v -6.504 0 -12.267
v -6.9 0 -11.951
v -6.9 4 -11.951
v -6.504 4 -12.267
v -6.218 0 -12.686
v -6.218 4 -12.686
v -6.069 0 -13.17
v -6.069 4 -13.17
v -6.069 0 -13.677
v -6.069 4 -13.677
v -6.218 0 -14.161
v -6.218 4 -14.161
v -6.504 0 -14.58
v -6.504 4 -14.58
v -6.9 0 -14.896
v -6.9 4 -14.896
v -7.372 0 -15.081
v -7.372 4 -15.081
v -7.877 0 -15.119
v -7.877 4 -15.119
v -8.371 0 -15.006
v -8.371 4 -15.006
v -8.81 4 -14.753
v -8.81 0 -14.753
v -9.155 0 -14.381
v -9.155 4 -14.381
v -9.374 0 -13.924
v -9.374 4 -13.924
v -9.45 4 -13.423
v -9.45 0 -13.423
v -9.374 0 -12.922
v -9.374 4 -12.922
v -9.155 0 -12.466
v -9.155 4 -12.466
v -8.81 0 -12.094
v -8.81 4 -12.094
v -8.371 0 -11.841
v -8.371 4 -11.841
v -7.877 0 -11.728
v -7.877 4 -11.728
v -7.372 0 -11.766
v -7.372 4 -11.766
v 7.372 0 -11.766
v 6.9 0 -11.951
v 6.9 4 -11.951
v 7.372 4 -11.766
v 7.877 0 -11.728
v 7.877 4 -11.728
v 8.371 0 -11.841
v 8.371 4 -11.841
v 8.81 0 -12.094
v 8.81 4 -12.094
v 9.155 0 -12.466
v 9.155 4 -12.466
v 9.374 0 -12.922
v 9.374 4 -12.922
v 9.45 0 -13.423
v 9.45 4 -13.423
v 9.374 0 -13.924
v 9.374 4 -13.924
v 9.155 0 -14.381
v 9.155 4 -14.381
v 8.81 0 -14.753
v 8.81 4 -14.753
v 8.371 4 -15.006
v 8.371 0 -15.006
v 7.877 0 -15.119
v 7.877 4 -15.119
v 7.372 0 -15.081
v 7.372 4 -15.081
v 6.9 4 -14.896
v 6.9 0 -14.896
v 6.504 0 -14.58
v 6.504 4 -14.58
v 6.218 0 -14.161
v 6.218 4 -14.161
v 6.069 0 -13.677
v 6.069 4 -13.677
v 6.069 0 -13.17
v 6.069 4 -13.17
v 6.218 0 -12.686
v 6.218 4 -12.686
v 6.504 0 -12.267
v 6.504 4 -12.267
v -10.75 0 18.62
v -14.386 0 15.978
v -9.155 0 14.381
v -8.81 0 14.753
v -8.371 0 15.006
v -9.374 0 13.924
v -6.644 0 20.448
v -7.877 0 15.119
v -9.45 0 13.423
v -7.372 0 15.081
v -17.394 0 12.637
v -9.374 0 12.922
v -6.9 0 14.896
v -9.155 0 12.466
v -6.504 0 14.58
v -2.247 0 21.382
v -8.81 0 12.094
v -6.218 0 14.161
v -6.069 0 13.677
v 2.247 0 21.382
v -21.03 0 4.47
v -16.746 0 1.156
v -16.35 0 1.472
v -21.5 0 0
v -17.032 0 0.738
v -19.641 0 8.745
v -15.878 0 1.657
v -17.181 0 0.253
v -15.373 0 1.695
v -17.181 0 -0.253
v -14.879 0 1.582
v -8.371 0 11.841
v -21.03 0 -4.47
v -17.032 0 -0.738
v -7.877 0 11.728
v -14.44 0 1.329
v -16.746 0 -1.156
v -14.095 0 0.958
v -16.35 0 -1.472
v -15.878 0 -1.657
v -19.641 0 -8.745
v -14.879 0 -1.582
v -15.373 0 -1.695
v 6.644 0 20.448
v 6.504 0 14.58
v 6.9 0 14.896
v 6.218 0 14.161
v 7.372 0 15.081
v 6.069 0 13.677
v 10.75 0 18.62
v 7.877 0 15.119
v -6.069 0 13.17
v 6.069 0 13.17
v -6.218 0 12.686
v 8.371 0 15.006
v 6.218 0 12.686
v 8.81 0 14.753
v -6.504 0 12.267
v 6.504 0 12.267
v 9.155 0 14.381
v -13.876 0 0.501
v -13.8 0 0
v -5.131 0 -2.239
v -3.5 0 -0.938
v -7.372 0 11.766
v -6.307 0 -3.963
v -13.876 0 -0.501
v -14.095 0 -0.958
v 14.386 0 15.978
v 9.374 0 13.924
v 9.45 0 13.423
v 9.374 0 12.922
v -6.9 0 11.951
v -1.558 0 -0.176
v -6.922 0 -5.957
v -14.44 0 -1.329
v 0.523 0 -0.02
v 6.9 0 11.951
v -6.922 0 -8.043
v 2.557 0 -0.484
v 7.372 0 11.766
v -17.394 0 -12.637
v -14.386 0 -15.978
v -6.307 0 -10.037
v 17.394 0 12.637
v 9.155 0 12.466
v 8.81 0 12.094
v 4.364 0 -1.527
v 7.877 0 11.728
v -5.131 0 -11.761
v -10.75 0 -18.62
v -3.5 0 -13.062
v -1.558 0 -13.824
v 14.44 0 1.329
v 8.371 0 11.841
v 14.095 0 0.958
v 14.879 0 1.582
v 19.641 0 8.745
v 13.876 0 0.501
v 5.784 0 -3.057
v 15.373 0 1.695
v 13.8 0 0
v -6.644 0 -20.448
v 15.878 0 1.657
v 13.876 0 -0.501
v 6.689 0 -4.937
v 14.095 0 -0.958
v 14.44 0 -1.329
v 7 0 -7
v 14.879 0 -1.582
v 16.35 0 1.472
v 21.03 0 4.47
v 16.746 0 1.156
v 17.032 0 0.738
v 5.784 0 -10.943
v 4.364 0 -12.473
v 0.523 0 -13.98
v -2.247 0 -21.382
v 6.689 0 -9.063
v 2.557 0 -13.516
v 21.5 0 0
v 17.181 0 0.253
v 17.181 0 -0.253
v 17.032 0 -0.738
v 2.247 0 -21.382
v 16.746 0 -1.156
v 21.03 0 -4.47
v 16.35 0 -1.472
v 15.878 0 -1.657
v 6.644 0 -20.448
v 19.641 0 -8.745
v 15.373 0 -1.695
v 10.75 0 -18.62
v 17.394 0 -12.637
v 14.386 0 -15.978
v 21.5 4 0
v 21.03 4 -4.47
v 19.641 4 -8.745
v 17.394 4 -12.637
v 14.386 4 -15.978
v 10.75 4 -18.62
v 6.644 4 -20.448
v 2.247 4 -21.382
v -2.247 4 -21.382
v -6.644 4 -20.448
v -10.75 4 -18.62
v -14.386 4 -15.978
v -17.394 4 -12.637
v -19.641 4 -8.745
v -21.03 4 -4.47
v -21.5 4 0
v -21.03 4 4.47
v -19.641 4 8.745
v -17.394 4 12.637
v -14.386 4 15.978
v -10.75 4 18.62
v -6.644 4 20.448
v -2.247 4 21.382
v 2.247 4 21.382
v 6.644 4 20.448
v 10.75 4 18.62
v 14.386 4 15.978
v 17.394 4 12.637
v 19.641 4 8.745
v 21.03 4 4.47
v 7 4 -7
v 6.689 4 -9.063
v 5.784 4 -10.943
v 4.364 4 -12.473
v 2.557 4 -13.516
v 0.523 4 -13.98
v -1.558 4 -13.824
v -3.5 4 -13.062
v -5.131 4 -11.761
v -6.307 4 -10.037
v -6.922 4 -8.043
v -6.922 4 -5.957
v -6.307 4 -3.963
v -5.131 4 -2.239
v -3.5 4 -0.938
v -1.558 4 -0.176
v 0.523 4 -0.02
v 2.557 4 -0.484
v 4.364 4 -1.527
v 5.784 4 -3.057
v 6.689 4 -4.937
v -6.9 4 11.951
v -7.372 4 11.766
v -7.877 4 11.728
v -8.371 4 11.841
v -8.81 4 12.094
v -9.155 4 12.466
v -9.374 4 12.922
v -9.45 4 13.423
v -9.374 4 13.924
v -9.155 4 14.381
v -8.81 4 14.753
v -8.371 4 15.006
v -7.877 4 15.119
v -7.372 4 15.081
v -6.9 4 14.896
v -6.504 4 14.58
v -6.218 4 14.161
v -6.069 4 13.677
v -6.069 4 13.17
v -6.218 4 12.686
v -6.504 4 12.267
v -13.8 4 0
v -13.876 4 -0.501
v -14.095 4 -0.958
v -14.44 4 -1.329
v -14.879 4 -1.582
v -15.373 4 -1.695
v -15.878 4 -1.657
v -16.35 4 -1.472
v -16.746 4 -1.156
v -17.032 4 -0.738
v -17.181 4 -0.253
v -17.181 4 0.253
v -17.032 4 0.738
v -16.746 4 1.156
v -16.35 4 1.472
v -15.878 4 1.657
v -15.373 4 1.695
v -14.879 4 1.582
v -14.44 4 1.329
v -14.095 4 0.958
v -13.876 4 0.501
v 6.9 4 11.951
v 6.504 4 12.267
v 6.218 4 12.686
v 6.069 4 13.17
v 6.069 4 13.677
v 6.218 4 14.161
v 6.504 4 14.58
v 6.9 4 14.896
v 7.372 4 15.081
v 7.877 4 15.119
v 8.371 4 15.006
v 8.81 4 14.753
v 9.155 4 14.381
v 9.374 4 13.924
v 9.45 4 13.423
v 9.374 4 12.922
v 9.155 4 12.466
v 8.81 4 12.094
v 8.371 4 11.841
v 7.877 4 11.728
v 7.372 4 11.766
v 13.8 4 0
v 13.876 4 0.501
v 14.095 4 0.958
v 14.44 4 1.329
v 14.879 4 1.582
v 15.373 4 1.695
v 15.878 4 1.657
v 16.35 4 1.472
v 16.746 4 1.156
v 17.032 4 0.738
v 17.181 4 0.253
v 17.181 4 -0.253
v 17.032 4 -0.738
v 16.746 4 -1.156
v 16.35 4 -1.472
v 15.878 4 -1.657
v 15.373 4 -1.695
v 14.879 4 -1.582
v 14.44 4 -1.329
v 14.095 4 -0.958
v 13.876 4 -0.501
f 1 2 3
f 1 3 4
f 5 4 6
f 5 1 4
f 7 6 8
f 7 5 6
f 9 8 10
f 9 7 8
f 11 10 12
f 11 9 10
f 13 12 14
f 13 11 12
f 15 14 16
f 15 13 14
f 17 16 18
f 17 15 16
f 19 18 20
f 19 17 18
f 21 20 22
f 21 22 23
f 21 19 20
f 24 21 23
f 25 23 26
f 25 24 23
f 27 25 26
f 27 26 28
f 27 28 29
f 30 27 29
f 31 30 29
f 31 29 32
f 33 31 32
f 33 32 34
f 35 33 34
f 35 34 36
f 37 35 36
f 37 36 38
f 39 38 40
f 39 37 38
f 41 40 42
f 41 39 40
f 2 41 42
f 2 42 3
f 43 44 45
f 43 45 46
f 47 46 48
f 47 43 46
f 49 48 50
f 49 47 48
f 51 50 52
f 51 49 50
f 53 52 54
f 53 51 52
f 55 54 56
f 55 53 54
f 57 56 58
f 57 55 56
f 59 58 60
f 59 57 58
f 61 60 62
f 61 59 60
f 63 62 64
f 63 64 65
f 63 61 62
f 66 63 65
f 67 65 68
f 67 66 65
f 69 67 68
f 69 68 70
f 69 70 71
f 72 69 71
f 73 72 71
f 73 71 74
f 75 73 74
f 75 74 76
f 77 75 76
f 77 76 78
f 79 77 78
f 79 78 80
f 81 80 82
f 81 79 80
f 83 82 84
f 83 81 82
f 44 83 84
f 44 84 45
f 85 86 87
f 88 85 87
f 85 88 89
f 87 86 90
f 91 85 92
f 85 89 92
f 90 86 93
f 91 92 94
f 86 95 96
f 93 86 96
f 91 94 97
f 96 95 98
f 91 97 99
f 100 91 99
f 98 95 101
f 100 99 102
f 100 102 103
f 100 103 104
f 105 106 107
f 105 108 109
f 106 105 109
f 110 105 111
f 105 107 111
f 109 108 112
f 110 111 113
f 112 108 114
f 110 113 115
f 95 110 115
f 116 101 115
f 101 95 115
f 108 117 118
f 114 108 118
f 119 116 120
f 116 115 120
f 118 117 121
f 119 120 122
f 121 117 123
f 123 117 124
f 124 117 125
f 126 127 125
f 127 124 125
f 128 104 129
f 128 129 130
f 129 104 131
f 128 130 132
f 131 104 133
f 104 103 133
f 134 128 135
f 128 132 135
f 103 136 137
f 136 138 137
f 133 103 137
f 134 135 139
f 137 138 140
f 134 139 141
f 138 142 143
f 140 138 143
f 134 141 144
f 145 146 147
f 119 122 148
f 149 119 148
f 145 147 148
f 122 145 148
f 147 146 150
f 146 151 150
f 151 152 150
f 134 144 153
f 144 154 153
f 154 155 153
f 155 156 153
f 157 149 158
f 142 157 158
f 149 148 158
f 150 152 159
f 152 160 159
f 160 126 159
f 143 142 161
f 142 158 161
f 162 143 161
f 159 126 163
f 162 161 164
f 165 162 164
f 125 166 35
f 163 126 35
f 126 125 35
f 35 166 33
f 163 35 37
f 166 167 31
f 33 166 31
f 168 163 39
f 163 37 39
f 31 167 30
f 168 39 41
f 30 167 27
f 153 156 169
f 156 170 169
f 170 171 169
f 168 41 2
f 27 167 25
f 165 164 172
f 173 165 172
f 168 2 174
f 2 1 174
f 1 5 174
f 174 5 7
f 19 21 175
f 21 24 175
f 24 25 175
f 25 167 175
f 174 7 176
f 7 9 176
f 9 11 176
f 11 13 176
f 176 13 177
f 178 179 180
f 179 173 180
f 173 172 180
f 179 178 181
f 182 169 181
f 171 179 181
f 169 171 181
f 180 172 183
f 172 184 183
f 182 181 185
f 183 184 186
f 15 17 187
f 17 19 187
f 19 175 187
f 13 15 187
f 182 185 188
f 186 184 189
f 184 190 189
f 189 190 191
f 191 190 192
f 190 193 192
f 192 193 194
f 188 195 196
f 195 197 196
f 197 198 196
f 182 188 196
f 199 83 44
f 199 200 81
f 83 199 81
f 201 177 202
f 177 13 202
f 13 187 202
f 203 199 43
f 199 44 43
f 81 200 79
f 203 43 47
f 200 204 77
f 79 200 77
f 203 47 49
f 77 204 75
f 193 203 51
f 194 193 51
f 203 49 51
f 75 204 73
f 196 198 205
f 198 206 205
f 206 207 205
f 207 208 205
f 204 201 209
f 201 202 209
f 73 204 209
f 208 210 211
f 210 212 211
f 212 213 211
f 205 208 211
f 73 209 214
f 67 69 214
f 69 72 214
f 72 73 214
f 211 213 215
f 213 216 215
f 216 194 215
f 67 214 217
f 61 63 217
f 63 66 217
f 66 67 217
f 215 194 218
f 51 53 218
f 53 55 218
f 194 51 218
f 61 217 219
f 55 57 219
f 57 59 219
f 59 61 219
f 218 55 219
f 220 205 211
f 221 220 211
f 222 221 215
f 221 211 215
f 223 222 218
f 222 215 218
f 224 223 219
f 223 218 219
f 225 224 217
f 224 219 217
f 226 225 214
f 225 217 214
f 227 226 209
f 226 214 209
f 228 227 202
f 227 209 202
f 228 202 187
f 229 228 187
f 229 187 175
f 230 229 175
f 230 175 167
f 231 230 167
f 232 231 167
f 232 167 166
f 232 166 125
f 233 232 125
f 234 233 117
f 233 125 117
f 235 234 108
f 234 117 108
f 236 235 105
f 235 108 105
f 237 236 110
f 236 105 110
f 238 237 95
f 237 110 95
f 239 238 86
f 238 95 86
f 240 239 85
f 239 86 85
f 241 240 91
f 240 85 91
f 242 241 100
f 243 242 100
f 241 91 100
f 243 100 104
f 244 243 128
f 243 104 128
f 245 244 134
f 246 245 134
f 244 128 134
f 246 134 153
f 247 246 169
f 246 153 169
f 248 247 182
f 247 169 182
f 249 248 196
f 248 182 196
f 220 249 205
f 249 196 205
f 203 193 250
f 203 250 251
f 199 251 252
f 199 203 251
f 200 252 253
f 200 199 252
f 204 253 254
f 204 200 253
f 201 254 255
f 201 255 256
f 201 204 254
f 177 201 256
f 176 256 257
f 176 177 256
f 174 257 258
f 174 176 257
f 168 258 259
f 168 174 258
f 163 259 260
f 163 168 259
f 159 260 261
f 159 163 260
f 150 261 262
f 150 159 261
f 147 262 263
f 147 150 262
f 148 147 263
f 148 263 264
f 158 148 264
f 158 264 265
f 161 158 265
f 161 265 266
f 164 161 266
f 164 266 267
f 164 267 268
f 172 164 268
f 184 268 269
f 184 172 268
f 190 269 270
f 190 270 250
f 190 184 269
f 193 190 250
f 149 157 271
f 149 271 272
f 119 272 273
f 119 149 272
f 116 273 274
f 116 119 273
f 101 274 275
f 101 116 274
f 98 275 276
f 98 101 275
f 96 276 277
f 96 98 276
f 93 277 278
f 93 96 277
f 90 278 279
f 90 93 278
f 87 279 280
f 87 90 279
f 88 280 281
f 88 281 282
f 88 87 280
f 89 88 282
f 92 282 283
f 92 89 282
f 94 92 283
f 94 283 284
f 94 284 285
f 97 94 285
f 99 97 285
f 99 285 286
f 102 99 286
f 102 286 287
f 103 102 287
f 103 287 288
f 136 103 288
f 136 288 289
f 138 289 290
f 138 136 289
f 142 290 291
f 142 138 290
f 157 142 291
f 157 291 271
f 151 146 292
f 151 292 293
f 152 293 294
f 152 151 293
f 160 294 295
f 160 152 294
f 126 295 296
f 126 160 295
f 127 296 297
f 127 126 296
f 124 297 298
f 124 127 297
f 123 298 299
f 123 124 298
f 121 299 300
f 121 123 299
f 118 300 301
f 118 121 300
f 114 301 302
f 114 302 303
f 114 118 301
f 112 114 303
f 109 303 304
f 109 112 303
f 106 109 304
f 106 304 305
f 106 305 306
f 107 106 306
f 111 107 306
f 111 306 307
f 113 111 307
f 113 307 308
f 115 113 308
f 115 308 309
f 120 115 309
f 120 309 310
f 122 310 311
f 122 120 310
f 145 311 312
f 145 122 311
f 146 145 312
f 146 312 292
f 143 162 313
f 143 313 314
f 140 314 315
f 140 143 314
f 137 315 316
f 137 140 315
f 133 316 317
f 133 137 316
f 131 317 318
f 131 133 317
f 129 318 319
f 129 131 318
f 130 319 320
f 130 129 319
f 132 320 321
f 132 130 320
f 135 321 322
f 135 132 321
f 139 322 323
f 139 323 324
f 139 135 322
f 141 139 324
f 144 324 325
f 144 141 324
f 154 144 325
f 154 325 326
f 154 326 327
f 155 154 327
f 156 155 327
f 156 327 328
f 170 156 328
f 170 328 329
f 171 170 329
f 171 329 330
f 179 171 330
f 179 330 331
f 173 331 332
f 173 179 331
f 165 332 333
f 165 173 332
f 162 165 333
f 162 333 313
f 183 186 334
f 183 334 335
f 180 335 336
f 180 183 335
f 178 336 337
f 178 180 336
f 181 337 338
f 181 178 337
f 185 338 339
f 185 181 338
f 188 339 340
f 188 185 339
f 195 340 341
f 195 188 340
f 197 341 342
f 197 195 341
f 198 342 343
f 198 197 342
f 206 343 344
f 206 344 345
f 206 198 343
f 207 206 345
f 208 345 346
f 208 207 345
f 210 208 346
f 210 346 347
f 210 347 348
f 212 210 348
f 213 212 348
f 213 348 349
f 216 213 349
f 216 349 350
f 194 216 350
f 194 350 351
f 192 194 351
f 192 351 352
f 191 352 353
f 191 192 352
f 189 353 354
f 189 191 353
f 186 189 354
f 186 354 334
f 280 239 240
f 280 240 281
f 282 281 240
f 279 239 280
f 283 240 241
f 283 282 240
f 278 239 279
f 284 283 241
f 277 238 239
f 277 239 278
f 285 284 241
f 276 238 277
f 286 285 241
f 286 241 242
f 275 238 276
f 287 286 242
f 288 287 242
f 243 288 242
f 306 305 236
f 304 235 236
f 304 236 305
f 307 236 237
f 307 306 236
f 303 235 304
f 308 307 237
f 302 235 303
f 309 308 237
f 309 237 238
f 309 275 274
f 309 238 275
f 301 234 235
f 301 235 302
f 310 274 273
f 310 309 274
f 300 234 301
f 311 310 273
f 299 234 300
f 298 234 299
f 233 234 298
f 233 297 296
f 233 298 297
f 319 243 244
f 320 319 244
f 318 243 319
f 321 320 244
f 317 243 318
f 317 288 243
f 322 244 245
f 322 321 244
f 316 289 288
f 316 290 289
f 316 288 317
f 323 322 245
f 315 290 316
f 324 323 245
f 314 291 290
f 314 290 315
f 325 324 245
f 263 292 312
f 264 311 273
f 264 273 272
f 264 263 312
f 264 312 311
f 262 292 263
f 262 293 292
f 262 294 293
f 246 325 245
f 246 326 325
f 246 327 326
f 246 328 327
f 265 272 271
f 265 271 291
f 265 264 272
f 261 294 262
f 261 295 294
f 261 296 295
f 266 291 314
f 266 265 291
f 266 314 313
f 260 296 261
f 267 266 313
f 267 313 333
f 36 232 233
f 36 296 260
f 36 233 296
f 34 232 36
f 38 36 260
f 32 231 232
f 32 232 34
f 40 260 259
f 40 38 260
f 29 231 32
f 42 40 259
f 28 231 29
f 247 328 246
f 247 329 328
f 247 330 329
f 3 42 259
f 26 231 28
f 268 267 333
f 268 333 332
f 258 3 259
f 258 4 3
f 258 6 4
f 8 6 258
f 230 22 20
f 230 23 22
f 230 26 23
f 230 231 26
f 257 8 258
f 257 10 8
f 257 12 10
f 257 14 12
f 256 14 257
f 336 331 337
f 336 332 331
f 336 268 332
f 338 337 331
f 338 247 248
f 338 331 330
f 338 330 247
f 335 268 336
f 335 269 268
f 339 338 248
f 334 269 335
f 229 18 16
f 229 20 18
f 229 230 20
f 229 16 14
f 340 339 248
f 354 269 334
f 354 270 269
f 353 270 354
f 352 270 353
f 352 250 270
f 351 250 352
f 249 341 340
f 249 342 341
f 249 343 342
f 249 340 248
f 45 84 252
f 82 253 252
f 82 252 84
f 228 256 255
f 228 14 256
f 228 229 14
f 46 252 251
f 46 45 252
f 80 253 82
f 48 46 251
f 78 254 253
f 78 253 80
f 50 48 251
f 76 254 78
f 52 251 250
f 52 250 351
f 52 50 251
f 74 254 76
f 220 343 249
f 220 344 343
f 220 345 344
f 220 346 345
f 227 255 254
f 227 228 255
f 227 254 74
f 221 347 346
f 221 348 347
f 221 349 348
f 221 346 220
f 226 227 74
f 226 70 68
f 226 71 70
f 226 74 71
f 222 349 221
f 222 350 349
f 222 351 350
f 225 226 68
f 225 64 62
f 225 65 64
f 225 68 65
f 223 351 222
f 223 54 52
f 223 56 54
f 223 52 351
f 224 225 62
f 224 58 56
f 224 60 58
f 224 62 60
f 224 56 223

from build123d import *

# Parameters (mm, degrees)
SKETCH3_R           = 21.5
SKETCH3_R_2         = 7
BOSS_EXTRUDE1_DEPTH = 4
SKETCH3_4_R         = 1.7
CUT_EXTRUDE2_DEPTH  = 4
CIRPATTERN1_COUNT   = 6


with BuildPart() as part:
    # Sketch3 → Boss-Extrude1 (new body)
    with BuildSketch(Plane(origin=(0, 0, 0), x_dir=(1, 0, 0), z_dir=(0, 1, 0))):
        Circle(SKETCH3_R)
        with Locations((0, 7)):
            Circle(SKETCH3_R_2, mode=Mode.SUBTRACT)
    extrude(amount=BOSS_EXTRUDE1_DEPTH)

    # Sketch3<4> → Cut-Extrude2 (cut)
    with BuildSketch(Plane(origin=(0, 0, 0), x_dir=(1, 0, 0), z_dir=(0, 1, 0))):
        with Locations((-15.5, 0)):
            Circle(SKETCH3_4_R)
    cut_extrude2 = extrude(amount=CUT_EXTRUDE2_DEPTH, mode=Mode.SUBTRACT)

    # CirPattern1: Cut-Extrude2 ×6 about axis
    cirpattern1_axis = Axis((0, 0, 0), (0, 1, 0))
    for i in range(1, CIRPATTERN1_COUNT):
        add(cut_extrude2.rotate(cirpattern1_axis, i * 360 / CIRPATTERN1_COUNT), mode=Mode.SUBTRACT)


solid = part.part
